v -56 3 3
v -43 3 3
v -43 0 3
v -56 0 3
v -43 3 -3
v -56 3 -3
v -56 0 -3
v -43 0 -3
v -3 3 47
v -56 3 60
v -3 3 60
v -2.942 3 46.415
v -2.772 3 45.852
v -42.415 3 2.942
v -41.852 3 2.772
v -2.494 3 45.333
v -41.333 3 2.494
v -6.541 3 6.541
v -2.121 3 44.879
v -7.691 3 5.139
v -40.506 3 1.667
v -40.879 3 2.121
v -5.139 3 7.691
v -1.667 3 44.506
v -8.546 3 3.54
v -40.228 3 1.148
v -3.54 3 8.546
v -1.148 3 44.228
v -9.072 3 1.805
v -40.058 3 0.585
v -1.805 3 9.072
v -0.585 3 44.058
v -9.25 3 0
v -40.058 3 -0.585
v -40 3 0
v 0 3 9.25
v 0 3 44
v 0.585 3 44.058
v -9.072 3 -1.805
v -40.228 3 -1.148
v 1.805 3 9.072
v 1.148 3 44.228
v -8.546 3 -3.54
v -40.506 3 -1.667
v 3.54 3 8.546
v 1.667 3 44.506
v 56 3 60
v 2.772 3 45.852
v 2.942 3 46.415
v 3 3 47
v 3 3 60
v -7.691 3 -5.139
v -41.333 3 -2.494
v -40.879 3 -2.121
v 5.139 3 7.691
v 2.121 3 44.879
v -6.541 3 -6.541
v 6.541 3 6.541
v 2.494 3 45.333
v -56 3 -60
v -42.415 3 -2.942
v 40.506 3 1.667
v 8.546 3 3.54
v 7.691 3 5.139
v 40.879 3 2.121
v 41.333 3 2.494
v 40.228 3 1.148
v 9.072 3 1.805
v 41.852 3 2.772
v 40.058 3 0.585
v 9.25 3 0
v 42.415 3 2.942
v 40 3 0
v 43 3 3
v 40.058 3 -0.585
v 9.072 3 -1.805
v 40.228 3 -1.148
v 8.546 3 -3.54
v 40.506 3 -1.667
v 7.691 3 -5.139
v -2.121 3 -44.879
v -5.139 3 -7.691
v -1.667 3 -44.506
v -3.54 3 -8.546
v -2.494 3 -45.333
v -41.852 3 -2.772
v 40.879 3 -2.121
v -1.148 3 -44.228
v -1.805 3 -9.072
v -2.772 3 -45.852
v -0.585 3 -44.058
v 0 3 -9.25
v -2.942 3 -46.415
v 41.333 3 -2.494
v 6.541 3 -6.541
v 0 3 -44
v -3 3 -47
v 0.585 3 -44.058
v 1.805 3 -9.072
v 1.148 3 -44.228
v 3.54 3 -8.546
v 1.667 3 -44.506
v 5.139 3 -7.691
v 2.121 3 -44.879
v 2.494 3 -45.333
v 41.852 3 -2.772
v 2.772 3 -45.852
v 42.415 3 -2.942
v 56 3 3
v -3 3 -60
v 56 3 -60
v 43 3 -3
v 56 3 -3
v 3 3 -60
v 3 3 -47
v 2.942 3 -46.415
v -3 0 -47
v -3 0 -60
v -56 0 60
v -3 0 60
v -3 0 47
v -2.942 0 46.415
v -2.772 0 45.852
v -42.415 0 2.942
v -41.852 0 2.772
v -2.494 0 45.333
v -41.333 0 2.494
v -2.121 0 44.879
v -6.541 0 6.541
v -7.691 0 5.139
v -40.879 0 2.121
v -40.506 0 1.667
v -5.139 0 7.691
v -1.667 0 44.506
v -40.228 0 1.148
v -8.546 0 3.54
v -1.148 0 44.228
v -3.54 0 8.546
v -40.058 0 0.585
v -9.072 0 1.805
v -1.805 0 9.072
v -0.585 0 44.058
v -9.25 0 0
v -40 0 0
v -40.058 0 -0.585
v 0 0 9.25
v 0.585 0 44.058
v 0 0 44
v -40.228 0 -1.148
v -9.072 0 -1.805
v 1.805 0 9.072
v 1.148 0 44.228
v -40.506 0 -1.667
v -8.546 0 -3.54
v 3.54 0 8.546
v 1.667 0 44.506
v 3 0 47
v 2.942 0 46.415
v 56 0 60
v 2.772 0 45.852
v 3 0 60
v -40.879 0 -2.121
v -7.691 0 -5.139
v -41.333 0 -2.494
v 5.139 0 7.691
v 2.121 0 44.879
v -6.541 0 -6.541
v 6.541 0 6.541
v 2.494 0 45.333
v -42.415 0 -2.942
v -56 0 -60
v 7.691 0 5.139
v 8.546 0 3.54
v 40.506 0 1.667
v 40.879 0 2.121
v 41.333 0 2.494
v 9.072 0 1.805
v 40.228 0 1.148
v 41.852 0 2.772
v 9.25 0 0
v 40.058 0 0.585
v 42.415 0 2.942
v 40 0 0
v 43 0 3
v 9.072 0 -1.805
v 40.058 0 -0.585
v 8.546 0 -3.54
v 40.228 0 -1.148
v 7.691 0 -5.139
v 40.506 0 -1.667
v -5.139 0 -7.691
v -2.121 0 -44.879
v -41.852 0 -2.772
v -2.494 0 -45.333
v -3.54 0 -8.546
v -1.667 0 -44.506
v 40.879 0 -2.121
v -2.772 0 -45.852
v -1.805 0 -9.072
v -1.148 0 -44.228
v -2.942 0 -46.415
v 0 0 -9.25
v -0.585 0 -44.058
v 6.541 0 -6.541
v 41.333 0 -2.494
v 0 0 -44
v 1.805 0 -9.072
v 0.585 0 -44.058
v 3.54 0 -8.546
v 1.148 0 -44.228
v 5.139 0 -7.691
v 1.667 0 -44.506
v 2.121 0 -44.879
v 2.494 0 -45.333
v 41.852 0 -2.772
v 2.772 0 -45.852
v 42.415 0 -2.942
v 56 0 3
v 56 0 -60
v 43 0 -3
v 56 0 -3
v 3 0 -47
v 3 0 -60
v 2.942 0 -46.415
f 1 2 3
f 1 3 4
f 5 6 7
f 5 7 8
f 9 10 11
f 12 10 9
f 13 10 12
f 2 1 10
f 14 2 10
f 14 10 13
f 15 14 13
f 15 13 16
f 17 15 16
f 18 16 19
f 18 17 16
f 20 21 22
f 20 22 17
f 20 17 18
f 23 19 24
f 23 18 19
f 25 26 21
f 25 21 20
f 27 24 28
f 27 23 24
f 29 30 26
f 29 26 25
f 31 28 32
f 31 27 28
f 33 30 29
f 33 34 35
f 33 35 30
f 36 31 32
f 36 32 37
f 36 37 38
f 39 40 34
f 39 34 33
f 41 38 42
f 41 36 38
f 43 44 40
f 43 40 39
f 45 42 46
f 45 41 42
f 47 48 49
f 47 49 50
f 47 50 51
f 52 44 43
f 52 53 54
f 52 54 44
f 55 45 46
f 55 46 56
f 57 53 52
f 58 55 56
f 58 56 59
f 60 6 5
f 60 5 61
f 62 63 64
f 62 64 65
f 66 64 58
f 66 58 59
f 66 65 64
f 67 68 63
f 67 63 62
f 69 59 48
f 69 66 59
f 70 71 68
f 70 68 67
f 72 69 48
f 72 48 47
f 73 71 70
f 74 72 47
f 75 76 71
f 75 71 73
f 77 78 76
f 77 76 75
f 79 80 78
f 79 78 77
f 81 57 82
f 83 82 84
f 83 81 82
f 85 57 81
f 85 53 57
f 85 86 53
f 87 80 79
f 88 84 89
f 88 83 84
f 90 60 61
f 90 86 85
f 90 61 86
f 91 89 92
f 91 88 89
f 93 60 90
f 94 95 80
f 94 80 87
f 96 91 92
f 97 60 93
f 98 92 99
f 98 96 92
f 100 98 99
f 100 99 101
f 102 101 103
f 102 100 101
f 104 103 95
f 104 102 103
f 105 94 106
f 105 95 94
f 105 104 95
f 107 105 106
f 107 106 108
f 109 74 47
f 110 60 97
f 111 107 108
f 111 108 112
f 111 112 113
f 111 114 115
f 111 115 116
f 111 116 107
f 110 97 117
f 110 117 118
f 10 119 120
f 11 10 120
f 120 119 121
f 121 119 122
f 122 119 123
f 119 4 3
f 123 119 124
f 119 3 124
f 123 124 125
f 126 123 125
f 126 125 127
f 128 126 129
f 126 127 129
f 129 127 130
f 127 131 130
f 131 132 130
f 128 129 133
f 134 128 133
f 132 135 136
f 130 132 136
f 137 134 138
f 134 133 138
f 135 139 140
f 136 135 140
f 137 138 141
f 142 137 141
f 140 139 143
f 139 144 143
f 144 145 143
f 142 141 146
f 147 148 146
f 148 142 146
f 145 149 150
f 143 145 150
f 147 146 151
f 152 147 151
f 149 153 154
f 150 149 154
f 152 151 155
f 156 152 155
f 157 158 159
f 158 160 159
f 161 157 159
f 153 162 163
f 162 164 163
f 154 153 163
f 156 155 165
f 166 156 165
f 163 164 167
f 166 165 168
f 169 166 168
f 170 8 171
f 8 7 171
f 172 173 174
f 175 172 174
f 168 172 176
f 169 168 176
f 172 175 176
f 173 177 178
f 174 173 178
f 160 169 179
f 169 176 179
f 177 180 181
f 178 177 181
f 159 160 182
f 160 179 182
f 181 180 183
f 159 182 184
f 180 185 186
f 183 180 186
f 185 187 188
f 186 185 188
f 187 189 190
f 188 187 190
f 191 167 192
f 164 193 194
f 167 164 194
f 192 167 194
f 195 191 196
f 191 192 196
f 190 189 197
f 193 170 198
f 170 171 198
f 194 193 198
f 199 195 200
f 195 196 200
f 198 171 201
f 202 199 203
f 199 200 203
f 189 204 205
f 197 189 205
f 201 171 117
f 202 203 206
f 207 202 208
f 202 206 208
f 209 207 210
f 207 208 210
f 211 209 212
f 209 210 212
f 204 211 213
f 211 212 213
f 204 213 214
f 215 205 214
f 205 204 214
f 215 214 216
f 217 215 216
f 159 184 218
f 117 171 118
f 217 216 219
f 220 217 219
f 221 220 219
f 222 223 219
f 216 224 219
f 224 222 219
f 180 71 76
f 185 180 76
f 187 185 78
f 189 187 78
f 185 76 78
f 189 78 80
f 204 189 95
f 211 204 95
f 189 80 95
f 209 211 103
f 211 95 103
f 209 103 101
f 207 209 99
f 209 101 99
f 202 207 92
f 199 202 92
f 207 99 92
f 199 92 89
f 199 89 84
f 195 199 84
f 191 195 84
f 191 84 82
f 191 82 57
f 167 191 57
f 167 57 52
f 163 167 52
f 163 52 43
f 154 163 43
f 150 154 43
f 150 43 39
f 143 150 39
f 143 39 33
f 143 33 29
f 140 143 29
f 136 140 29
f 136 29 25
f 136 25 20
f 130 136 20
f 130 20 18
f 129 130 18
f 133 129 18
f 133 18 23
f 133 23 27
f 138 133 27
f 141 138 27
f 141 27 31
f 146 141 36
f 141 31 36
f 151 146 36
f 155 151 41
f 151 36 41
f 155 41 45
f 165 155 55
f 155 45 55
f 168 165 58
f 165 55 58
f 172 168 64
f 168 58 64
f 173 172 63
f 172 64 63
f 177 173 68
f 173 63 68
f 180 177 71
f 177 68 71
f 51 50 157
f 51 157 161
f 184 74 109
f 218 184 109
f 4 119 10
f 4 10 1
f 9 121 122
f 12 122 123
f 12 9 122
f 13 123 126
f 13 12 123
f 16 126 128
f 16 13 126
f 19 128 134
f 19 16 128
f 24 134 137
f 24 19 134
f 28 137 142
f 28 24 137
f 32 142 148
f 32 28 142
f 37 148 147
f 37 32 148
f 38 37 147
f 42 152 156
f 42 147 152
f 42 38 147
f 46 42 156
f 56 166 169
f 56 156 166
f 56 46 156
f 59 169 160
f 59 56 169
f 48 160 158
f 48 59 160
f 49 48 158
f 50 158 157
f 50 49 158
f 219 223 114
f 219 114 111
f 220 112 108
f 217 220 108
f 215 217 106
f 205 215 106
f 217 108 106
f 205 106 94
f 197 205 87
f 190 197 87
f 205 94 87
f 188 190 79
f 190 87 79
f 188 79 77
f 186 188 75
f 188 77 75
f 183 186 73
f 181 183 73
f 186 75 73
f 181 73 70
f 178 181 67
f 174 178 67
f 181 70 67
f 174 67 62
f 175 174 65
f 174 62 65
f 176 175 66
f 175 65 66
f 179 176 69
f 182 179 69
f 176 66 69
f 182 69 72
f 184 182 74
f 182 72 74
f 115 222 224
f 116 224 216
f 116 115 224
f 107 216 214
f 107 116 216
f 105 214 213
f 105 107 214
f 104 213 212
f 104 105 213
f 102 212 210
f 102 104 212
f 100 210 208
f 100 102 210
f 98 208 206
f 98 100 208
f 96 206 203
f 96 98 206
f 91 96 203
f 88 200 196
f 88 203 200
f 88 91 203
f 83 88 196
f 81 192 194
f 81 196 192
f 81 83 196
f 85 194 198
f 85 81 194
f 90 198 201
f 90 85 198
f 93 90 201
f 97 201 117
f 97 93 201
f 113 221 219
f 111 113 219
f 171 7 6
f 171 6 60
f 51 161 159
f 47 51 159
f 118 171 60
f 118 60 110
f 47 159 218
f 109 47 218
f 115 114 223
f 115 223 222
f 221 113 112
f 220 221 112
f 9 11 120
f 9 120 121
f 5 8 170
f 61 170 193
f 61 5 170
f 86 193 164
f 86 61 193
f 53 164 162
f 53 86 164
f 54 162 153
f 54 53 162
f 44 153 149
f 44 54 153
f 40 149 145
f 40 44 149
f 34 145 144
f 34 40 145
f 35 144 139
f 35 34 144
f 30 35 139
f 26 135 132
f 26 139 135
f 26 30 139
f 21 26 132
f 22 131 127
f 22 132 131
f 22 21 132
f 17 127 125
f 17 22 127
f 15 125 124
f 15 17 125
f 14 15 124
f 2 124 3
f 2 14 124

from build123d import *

# Parameters (mm, degrees)
SKETCH1_W           = 112
SKETCH1_H           = 120
BOSS_EXTRUDE1_DEPTH = 3
SKETCH2_R           = 9.25
CUT_EXTRUDE1_DEPTH  = 10
CUT_EXTRUDE2_DEPTH  = 10


with BuildPart() as part:
    # Sketch1 → Boss-Extrude1 (new body)
    with BuildSketch(Plane(origin=(0, 0, 0), x_dir=(1, 0, 0), z_dir=(0, 1, 0))):
        Rectangle(SKETCH1_W, SKETCH1_H)
    extrude(amount=BOSS_EXTRUDE1_DEPTH)

    # Sketch2 → Cut-Extrude1 (cut)
    with BuildSketch(Plane(origin=(0, 3, 0), x_dir=(1, 0, 0), z_dir=(0, 1, 0))):
        Circle(SKETCH2_R)
    extrude(amount=-CUT_EXTRUDE1_DEPTH, mode=Mode.SUBTRACT)

    # Sketch3 → Cut-Extrude2 (cut)
    with BuildSketch(Plane(origin=(0, 3, 0), x_dir=(1, 0, 0), z_dir=(0, 1, 0))):
        with BuildLine():
            Line((-3, -60), (-3, -47))
            ThreePointArc((-3, -47), (0, -44), (3, -47))
            Line((3, -47), (3, -60))
            Line((3, -60), (-3, -60))
        make_face()
        with BuildLine():
            Line((-3, 60), (3, 60))
            Line((3, 60), (3, 47))
            ThreePointArc((3, 47), (0, 44), (-3, 47))
            Line((-3, 47), (-3, 60))
        make_face()
        with BuildLine():
            Line((56, 3), (43, 3))
            ThreePointArc((43, 3), (40, 0), (43, -3))
            Line((43, -3), (56, -3))
            Line((56, -3), (56, 3))
        make_face()
        with BuildLine():
            Line((-43, -3), (-56, -3))
            Line((-56, -3), (-56, 3))
            Line((-56, 3), (-43, 3))
            ThreePointArc((-43, 3), (-40, 0), (-43, -3))
        make_face()
    extrude(amount=-CUT_EXTRUDE2_DEPTH, mode=Mode.SUBTRACT)


solid = part.part
